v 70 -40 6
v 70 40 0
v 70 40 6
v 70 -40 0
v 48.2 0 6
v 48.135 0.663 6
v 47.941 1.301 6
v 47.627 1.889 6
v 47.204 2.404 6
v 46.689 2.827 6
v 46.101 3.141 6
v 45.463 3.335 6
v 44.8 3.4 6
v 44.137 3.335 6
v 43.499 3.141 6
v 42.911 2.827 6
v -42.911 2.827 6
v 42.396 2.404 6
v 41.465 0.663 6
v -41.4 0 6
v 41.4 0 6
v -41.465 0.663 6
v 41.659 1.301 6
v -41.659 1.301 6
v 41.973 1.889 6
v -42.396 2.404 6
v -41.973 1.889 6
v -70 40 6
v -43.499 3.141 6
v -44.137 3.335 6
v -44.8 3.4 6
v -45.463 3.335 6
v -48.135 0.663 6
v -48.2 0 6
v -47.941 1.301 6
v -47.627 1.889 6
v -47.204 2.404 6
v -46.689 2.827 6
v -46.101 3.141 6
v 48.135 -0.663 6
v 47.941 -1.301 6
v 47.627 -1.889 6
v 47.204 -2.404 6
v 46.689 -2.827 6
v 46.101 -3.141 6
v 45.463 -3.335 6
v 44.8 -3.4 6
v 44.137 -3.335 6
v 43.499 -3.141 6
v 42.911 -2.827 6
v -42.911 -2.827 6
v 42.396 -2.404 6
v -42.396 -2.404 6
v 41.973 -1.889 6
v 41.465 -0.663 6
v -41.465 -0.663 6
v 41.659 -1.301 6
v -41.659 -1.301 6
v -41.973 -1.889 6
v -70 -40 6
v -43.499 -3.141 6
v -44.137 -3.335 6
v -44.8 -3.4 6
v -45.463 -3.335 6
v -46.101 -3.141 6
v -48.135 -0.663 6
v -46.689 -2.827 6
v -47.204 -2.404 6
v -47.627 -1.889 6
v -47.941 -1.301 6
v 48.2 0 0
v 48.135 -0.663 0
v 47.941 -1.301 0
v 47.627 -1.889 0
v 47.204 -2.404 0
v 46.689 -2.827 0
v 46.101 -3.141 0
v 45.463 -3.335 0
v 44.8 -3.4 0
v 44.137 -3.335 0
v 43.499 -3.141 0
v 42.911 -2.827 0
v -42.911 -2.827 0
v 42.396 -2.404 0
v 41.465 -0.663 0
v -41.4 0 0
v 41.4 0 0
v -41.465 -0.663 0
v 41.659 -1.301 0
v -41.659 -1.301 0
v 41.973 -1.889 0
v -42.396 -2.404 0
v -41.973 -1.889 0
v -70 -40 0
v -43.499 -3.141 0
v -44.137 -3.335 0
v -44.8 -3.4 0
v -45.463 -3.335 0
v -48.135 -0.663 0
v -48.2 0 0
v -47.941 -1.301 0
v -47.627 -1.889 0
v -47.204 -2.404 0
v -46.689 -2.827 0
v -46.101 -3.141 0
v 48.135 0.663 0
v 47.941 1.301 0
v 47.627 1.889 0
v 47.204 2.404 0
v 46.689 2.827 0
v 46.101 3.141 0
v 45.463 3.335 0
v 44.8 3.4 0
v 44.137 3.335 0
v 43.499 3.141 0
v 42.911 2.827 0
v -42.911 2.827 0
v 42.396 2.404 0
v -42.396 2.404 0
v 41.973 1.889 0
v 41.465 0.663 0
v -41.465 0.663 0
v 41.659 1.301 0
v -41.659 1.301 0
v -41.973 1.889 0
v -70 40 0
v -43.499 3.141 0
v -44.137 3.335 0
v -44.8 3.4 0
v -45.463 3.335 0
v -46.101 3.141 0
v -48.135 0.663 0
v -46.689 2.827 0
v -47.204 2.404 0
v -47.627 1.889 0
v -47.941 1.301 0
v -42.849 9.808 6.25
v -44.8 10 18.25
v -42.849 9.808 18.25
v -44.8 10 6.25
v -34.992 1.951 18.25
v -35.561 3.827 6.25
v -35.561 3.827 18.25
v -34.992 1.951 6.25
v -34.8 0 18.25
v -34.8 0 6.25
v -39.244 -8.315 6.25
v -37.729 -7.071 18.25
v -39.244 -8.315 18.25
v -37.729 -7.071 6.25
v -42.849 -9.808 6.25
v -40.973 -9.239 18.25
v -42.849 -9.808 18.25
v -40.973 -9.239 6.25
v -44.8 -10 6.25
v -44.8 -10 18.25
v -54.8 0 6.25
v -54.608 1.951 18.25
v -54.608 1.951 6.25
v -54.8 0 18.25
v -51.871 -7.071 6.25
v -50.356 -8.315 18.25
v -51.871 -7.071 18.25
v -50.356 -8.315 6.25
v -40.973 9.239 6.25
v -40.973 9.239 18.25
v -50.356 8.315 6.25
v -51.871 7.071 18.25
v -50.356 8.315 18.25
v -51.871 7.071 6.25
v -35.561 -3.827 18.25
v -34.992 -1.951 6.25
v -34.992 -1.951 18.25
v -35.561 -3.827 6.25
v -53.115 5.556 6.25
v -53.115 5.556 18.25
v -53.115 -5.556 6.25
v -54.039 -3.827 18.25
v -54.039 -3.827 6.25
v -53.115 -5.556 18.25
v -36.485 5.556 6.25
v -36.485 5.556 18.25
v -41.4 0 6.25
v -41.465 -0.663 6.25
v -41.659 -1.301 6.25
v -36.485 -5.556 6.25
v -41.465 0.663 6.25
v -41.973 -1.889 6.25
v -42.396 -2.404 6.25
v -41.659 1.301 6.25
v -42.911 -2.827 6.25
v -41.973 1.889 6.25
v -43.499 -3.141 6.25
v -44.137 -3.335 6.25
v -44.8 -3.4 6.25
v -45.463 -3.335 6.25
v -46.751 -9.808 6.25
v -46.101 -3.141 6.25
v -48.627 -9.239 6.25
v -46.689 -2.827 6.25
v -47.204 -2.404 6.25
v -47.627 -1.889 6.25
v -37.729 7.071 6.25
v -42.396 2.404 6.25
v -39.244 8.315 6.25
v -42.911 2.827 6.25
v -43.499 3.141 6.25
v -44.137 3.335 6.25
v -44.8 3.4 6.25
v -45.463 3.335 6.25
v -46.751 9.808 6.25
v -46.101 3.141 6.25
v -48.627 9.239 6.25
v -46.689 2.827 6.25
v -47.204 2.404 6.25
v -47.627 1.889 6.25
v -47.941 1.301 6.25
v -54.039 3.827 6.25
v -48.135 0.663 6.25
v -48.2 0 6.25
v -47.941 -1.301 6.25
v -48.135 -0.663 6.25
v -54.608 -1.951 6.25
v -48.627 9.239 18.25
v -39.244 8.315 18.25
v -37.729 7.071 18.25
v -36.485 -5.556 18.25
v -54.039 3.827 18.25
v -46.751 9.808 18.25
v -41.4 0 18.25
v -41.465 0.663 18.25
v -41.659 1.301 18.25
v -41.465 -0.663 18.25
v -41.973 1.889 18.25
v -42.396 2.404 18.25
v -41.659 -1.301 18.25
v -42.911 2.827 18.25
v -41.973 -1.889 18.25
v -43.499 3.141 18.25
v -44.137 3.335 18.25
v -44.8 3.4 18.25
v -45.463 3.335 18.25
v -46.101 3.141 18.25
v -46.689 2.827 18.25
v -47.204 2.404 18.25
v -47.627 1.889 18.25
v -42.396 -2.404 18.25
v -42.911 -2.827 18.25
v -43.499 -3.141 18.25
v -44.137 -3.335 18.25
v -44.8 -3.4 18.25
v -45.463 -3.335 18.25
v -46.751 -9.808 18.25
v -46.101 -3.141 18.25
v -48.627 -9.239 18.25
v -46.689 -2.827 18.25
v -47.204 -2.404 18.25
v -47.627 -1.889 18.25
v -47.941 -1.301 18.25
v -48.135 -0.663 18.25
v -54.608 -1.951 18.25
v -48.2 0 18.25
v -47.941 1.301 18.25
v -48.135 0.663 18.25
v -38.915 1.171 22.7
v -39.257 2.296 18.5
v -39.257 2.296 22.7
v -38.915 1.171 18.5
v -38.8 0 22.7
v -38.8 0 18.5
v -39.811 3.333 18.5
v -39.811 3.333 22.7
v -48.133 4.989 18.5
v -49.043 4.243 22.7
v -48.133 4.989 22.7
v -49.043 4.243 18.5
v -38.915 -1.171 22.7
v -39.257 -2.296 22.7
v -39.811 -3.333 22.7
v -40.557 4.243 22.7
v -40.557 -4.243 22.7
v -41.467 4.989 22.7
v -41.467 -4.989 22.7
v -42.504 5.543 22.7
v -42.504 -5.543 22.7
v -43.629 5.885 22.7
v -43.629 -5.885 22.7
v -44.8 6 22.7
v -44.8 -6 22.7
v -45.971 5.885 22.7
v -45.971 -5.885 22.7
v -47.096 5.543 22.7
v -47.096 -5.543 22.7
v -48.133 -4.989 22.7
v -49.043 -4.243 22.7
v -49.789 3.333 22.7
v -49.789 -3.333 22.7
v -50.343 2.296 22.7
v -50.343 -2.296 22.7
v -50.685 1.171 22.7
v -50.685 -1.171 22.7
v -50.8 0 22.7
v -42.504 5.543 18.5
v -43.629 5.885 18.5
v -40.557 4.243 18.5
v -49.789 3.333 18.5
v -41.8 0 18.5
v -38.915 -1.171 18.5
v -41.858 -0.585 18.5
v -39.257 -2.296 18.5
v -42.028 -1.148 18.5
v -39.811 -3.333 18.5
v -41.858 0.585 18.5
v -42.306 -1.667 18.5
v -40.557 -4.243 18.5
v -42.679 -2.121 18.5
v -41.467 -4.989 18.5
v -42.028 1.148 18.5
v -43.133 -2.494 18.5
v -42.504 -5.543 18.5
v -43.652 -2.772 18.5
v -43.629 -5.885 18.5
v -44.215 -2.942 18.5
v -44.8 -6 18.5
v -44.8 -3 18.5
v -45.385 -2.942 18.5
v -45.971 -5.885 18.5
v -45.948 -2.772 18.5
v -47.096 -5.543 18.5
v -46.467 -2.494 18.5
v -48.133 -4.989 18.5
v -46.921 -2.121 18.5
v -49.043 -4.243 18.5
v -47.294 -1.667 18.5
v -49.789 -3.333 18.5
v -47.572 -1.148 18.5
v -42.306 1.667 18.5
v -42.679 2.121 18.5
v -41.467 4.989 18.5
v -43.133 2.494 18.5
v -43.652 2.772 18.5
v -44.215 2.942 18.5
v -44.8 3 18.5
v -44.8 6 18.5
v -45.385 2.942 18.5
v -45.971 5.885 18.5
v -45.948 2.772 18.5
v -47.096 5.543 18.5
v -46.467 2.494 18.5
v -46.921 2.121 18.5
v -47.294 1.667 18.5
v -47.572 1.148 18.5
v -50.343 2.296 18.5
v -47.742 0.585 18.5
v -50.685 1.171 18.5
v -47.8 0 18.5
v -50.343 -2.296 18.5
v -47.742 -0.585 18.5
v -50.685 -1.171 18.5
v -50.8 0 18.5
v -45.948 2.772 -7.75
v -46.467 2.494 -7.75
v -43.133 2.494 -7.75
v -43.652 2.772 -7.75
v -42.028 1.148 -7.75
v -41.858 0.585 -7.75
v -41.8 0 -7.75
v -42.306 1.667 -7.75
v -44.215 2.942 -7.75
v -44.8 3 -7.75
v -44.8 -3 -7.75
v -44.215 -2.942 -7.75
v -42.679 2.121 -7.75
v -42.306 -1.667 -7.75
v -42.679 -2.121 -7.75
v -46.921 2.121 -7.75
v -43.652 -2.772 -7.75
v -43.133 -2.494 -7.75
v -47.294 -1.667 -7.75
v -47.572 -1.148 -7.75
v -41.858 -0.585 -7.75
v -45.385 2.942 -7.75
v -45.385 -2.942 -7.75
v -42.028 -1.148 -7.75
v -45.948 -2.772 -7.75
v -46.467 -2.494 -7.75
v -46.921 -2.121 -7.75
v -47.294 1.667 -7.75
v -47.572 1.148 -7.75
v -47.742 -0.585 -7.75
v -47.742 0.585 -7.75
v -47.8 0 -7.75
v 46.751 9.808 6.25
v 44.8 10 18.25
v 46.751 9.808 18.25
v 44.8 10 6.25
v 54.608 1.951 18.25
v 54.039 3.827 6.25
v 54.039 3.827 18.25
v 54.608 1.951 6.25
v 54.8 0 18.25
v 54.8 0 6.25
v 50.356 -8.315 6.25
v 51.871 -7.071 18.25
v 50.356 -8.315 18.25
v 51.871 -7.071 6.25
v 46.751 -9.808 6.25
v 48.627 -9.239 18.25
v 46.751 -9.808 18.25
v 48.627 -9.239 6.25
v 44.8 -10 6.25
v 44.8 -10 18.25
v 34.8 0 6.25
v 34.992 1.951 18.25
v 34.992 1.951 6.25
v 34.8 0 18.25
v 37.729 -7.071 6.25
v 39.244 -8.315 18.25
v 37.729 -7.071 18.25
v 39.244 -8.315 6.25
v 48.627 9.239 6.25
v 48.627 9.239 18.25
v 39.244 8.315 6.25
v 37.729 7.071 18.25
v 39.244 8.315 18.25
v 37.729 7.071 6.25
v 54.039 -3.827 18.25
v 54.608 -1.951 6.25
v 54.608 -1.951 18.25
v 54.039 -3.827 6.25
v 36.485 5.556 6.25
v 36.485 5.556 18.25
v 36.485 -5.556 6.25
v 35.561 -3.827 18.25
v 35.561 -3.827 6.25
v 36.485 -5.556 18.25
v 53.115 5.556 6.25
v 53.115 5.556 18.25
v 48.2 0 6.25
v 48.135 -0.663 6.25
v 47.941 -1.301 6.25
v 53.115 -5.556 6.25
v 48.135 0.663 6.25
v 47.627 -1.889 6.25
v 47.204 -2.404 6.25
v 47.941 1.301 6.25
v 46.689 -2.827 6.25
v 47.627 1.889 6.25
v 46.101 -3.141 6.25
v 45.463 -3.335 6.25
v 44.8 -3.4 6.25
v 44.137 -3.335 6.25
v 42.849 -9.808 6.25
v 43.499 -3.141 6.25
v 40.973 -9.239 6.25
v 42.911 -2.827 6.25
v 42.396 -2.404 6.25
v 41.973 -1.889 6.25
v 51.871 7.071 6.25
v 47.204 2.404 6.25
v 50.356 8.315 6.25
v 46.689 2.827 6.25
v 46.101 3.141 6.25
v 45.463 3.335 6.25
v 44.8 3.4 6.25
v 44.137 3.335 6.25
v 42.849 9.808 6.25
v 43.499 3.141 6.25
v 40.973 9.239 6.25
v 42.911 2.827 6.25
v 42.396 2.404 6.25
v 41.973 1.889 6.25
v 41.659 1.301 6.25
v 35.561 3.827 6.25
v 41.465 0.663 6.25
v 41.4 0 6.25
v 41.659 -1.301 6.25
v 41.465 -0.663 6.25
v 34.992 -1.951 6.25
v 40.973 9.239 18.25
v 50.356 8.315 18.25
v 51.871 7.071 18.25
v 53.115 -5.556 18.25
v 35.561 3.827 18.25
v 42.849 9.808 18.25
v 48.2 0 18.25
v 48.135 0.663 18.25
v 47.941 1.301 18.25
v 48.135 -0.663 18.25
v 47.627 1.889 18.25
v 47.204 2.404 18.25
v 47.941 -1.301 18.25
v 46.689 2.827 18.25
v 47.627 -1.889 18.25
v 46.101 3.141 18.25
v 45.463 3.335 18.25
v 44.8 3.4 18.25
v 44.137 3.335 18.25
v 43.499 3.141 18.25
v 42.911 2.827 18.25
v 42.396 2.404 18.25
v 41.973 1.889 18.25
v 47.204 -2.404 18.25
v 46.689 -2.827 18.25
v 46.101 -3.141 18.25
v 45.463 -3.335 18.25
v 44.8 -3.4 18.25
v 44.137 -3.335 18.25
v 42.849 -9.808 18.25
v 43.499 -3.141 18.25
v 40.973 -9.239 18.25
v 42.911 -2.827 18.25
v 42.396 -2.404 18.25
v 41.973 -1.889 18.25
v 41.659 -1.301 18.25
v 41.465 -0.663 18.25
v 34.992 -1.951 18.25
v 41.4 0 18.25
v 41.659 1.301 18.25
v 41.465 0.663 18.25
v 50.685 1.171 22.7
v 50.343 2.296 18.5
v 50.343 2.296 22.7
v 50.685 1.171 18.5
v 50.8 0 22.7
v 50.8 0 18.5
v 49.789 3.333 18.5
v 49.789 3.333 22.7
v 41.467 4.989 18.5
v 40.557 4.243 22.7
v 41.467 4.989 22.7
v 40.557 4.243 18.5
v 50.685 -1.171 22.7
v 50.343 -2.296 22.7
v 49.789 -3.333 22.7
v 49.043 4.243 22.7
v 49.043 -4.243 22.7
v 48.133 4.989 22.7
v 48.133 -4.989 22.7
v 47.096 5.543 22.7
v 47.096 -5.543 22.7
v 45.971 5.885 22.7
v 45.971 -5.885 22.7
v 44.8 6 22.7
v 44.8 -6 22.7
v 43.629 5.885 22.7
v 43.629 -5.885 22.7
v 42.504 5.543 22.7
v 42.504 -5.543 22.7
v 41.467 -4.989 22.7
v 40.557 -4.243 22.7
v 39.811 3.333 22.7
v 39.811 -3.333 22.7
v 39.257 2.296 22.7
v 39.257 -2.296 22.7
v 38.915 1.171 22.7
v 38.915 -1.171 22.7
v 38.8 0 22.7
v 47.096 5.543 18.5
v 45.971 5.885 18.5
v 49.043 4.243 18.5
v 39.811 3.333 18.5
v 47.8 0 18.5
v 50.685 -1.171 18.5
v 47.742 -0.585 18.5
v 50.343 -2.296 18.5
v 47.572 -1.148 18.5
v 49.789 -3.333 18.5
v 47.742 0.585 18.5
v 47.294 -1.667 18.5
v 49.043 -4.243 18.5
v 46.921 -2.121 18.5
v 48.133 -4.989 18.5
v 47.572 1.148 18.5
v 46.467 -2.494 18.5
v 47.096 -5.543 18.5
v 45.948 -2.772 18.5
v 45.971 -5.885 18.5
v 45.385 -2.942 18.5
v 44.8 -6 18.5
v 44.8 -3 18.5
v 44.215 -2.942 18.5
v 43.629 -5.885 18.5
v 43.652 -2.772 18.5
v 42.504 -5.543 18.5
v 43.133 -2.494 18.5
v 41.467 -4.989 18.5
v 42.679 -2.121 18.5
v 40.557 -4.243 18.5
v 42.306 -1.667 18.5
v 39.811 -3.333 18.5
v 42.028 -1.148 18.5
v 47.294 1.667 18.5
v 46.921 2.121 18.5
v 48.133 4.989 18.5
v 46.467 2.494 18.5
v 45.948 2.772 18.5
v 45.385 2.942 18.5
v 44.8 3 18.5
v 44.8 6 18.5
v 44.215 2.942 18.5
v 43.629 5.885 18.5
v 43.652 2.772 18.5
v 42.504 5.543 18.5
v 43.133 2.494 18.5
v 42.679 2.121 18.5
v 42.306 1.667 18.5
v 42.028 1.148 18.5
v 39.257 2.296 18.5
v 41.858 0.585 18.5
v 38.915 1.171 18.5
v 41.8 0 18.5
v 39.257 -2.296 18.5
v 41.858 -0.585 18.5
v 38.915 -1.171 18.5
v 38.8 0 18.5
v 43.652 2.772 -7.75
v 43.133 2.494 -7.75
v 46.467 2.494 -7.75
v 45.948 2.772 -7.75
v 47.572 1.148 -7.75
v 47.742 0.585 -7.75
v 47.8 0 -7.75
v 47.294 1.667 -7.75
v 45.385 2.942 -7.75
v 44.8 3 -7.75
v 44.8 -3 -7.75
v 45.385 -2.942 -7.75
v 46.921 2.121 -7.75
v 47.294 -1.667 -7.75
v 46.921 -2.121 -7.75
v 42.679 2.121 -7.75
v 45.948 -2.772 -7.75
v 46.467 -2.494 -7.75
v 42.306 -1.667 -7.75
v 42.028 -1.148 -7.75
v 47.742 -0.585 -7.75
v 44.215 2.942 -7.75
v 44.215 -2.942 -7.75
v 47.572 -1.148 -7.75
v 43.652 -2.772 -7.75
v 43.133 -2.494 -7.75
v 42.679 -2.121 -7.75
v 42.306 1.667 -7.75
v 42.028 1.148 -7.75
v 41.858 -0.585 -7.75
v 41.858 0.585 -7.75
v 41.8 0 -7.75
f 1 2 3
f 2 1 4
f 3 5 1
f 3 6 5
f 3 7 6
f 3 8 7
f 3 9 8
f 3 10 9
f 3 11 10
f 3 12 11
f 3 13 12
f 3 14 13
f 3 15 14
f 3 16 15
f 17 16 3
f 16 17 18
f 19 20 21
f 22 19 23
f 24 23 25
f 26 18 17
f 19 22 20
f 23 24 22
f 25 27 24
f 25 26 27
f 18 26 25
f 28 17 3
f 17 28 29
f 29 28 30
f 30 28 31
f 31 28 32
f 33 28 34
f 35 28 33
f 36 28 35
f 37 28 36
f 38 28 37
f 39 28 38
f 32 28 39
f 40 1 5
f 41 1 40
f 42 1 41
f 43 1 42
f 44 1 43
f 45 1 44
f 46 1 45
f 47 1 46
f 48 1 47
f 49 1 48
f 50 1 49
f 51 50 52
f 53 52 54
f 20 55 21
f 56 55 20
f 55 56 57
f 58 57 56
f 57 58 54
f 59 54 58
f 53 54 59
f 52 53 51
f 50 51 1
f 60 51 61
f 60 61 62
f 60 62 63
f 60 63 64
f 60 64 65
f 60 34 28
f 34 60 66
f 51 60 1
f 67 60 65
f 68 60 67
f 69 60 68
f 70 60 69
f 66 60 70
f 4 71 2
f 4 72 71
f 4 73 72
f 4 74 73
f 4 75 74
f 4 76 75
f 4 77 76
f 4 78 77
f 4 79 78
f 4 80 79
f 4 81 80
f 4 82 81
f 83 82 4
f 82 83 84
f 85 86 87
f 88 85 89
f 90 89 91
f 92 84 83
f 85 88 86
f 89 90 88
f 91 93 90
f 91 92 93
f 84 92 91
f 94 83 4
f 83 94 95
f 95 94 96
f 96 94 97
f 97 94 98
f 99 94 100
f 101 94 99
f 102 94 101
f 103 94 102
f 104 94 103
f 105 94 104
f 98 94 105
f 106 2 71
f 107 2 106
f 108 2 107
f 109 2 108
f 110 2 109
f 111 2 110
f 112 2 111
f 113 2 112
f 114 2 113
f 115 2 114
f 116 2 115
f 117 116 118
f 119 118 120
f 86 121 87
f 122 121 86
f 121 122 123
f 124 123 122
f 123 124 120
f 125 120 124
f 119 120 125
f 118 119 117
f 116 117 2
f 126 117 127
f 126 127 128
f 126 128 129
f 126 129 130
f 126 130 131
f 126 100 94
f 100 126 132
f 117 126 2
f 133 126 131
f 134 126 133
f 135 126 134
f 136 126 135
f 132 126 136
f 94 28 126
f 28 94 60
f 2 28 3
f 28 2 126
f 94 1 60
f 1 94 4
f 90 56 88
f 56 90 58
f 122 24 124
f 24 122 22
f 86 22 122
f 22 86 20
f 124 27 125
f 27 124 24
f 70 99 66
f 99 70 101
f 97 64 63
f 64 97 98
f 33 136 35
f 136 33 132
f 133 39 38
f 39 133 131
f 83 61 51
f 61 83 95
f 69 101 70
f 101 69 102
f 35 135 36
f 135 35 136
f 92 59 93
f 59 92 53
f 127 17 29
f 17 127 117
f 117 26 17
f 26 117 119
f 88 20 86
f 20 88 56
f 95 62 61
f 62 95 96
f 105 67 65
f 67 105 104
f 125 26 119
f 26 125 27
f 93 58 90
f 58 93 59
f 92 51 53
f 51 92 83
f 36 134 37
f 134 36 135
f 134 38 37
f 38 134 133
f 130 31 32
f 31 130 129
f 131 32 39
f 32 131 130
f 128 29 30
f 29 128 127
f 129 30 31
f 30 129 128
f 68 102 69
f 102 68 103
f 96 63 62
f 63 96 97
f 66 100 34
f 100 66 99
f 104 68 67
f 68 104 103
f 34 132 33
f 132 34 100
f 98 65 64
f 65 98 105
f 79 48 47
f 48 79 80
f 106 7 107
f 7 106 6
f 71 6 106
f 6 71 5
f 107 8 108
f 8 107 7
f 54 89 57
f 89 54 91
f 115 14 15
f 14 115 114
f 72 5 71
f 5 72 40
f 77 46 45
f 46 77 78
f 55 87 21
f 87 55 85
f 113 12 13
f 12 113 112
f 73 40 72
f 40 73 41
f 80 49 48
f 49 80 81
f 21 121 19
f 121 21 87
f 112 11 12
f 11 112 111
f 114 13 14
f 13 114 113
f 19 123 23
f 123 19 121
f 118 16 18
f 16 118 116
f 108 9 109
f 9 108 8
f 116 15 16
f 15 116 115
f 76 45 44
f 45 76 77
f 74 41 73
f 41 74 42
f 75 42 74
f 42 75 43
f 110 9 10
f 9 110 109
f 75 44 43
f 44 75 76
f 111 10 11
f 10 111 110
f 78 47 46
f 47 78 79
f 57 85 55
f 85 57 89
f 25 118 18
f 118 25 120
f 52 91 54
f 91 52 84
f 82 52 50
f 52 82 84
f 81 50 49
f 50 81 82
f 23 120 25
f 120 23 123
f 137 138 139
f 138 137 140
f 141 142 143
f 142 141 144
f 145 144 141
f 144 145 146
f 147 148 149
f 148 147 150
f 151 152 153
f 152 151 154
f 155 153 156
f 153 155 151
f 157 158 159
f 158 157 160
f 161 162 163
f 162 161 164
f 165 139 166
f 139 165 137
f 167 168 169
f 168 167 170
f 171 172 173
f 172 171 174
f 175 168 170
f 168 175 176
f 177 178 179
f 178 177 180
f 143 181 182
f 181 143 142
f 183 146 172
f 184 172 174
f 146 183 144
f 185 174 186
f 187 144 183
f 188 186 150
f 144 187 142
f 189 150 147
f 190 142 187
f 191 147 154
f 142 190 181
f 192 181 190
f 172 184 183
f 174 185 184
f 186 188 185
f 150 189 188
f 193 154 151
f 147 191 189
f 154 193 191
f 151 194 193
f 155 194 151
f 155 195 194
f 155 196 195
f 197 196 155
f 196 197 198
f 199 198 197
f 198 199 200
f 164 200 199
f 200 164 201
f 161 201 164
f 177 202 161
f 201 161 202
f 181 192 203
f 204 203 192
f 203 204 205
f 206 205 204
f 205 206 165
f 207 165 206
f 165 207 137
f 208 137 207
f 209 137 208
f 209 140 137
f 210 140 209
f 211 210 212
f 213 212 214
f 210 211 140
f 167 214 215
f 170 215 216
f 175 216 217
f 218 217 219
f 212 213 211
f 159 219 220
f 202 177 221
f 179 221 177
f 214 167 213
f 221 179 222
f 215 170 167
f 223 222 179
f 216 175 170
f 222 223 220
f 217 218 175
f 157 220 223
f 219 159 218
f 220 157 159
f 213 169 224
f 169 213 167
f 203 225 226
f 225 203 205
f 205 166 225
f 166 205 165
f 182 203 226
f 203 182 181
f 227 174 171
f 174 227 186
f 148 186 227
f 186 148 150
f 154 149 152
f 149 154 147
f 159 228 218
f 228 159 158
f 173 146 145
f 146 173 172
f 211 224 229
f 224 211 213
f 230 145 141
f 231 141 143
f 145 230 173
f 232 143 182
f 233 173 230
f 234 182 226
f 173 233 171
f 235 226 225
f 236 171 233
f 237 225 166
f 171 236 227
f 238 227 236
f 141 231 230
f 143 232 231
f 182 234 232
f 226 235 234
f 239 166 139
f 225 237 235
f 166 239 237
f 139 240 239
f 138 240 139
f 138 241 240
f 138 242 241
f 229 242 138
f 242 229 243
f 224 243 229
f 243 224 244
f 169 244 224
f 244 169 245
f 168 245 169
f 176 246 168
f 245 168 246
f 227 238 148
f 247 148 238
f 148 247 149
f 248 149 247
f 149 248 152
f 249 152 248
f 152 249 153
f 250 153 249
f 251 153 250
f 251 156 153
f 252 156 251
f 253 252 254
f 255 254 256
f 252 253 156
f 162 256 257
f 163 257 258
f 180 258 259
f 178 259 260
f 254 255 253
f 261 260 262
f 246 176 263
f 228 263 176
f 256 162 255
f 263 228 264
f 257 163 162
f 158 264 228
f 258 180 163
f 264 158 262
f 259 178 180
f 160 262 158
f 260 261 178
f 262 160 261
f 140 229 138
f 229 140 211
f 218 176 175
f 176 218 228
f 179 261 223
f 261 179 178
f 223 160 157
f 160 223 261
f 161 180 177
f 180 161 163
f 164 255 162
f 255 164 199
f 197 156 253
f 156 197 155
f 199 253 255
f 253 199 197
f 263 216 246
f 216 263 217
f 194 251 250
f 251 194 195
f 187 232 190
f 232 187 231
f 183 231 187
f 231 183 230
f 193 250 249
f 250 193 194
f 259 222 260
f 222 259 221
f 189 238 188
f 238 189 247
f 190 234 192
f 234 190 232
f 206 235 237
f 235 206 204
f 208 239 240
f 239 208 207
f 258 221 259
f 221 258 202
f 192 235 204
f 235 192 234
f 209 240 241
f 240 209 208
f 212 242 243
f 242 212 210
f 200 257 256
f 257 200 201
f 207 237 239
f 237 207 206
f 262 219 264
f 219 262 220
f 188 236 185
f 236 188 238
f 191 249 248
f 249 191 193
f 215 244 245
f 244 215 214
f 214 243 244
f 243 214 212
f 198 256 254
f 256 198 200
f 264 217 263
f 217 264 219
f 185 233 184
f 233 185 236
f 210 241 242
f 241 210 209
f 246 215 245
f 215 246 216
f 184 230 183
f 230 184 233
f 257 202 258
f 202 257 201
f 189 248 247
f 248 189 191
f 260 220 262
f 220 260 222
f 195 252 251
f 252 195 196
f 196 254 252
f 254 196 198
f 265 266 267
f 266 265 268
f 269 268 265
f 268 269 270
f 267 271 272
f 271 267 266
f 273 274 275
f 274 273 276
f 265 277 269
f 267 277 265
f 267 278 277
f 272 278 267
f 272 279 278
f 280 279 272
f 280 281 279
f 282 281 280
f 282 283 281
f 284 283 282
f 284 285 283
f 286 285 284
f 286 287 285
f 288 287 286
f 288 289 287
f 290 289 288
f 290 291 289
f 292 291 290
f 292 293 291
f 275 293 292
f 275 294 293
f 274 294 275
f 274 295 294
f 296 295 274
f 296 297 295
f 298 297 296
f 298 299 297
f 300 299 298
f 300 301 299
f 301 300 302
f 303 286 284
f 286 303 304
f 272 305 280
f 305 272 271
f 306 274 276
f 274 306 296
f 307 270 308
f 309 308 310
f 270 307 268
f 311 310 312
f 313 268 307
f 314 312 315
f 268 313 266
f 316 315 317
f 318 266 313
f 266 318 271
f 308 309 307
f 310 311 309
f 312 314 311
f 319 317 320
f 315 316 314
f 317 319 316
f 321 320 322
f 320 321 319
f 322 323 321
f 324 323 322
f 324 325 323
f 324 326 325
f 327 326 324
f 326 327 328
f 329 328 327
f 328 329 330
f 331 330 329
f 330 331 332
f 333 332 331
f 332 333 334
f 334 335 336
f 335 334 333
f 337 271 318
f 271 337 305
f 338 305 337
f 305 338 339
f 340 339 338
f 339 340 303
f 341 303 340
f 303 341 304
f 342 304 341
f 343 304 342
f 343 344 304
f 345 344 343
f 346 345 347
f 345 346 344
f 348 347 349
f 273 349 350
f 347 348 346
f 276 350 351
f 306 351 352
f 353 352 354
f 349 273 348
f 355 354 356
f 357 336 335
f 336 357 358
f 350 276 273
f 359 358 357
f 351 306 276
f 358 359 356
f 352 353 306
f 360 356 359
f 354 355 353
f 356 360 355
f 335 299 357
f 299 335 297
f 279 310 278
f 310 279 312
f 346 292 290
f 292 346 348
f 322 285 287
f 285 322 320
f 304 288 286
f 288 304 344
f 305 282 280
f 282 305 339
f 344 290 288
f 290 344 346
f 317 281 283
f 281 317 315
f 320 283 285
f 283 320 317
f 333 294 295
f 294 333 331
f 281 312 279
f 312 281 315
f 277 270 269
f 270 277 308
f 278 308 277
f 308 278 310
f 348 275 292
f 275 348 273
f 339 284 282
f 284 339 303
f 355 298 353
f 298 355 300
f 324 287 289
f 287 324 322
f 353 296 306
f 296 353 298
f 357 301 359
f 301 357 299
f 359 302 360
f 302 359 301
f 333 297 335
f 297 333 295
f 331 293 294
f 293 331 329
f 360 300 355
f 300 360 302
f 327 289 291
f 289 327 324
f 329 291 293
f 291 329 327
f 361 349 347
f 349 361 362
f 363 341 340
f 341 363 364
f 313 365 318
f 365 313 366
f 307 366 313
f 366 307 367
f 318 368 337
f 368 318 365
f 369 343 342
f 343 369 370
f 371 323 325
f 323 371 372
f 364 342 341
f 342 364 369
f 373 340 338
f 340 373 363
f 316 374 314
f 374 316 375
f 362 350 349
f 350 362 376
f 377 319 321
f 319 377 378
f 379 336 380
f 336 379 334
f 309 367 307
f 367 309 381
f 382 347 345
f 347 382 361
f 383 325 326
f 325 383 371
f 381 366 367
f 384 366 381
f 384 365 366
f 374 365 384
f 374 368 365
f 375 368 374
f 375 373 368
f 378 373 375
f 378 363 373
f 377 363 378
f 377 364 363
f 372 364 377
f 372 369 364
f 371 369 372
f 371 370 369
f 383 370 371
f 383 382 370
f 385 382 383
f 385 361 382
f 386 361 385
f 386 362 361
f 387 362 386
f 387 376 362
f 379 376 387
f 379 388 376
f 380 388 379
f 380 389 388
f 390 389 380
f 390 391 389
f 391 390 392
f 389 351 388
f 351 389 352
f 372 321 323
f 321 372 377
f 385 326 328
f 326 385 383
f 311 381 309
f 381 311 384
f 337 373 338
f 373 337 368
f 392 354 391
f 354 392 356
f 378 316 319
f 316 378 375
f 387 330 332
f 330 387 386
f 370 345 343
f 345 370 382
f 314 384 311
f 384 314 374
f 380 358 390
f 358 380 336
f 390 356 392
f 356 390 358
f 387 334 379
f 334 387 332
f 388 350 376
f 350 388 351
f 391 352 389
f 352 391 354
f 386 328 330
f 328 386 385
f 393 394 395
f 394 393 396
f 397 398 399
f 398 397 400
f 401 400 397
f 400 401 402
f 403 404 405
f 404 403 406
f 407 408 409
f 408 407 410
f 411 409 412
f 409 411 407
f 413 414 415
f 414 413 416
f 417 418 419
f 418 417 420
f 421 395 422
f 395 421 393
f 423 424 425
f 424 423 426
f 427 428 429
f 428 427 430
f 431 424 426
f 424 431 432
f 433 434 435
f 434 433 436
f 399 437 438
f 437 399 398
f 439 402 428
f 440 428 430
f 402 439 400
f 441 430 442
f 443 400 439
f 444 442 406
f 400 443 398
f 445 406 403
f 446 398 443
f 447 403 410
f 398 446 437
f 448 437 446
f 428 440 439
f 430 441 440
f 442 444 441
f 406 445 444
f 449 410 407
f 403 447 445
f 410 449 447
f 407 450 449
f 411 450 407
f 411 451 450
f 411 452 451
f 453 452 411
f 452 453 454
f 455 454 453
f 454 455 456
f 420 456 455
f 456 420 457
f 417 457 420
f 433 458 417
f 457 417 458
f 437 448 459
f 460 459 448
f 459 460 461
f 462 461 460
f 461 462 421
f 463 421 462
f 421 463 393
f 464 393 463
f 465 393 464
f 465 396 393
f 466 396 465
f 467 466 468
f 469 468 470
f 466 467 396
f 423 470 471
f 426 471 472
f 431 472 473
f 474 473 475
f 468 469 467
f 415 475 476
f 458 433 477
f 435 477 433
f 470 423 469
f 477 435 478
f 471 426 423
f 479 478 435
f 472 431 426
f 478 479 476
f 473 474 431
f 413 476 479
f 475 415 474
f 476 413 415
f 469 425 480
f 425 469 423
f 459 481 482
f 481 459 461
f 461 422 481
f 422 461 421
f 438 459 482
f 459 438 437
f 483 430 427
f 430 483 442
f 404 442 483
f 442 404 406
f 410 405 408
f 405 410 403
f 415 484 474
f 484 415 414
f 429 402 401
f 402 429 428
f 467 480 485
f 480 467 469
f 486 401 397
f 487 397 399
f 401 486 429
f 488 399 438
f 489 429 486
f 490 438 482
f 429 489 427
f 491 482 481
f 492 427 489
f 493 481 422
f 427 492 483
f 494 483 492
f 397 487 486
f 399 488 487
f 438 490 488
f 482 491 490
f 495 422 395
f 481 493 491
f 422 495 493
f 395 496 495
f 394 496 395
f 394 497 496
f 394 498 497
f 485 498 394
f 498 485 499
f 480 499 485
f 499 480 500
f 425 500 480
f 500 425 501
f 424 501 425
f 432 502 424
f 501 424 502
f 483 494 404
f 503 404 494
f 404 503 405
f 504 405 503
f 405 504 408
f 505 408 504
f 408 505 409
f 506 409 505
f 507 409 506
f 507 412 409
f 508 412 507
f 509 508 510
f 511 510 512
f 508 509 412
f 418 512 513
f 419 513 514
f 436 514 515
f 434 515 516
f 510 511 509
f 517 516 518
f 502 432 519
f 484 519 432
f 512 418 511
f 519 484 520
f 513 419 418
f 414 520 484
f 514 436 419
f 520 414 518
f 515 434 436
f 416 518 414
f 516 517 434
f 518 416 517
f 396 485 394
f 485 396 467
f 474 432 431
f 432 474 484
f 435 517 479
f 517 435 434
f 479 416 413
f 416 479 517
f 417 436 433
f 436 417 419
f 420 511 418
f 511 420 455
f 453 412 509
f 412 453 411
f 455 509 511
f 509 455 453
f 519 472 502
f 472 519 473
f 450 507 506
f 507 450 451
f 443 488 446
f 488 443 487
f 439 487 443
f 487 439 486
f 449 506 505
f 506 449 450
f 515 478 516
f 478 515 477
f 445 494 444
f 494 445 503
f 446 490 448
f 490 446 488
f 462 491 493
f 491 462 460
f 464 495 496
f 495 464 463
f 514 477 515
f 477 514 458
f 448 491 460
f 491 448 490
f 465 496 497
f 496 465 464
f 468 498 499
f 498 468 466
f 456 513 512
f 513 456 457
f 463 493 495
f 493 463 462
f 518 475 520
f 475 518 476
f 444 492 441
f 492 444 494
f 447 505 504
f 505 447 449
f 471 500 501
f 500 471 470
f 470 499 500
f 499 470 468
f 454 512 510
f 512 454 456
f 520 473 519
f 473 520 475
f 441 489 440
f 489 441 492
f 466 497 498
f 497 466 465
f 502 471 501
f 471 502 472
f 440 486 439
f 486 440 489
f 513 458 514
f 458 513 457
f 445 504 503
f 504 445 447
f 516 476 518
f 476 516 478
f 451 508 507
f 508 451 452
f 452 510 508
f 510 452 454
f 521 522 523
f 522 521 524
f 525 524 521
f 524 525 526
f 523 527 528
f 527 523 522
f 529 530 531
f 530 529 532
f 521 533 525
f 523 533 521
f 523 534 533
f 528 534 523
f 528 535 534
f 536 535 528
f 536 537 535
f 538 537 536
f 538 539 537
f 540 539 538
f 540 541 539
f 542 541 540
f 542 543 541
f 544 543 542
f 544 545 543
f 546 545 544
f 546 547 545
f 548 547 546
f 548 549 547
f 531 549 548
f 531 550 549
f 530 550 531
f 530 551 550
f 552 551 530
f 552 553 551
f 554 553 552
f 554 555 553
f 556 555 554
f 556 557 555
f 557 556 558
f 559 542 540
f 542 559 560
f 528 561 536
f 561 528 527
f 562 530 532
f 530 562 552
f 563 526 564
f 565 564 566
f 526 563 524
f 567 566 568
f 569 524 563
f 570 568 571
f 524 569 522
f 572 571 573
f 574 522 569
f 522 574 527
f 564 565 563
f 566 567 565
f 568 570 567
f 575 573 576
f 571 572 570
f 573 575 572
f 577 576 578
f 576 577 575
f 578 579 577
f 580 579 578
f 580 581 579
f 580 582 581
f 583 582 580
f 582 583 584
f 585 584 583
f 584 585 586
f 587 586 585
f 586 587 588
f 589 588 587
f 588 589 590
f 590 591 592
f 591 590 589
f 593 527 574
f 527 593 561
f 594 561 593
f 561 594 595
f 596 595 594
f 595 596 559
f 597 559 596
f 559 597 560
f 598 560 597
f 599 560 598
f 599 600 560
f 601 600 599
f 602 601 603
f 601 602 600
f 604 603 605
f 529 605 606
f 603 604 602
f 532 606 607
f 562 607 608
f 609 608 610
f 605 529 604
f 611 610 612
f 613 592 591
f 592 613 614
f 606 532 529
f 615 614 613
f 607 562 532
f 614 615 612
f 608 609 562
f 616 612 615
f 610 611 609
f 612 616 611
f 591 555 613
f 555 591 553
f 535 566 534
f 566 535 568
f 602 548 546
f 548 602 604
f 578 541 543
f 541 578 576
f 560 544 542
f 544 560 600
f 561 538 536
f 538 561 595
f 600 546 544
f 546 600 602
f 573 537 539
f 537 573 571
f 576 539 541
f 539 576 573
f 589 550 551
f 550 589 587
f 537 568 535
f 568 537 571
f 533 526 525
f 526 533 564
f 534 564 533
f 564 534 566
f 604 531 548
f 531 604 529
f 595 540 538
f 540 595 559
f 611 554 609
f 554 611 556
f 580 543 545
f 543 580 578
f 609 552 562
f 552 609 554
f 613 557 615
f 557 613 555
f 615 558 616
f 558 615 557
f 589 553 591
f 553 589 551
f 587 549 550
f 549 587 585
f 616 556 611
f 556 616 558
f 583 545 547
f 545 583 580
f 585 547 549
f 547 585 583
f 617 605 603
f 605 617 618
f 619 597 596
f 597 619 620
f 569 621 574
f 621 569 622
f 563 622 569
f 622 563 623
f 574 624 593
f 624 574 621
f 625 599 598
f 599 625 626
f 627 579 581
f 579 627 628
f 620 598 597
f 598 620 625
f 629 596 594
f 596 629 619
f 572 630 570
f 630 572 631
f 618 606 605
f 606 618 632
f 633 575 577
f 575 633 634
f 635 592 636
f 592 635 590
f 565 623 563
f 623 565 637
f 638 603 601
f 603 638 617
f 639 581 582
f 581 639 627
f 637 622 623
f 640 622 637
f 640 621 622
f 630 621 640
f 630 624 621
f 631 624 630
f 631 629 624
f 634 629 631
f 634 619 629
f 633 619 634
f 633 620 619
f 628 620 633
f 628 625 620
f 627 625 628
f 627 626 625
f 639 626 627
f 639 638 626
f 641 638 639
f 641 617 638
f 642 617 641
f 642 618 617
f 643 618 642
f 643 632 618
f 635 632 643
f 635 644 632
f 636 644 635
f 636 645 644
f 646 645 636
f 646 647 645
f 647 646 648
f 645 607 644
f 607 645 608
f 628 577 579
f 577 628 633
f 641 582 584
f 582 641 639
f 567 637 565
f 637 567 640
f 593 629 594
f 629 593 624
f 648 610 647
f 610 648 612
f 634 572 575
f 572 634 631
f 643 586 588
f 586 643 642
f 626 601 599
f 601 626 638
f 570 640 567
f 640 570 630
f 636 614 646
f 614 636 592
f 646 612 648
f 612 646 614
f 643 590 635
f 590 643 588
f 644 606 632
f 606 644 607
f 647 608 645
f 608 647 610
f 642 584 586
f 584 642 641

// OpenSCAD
$fn = 32;

// ------------------------------------------------------------------------
// Standoff columns: 2 d20 standoffs, bolts d6
// Every part is its own module, assembly() places them once.
// ------------------------------------------------------------------------

// --- part 1 ---
module base_plate() {
  difference() {
    translate([-70, -40, 0]) cube([140, 80, 6]);
    translate([-44.8, 0, -1]) cylinder(h = 8, d = 6.8);
    translate([44.8, 0, -1]) cylinder(h = 8, d = 6.8);
  }
}

// --- part 2 ---
module spacer1() {
  difference() {
      translate([0, 0, 0]) cylinder(h = 12, d = 20);
      translate([0, 0, -1]) cylinder(h = 14, d = 6.8);
    }
}

// --- part 3 ---
module bolt1() {
  cylinder(h = 4.2, d = 12);
  translate([0, 0, -26.25]) cylinder(h = 26.25, d = 6);
}

// --- part 4 ---
module spacer2() {
  difference() {
      translate([0, 0, 0]) cylinder(h = 12, d = 20);
      translate([0, 0, -1]) cylinder(h = 14, d = 6.8);
    }
}

// --- part 5 ---
module bolt2() {
  cylinder(h = 4.2, d = 12);
  translate([0, 0, -26.25]) cylinder(h = 26.25, d = 6);
}

// --- assembly ---
module assembly() {
  translate([0, 0, 0]) rotate([0, 0, 0]) base_plate();
  translate([-44.8, 0, 6.25]) rotate([0, 0, 0]) spacer1();
  translate([-44.8, 0, 18.5]) rotate([0, 0, 0]) bolt1();
  translate([44.8, 0, 6.25]) rotate([0, 0, 0]) spacer2();
  translate([44.8, 0, 18.5]) rotate([0, 0, 0]) bolt2();
}

assembly();
